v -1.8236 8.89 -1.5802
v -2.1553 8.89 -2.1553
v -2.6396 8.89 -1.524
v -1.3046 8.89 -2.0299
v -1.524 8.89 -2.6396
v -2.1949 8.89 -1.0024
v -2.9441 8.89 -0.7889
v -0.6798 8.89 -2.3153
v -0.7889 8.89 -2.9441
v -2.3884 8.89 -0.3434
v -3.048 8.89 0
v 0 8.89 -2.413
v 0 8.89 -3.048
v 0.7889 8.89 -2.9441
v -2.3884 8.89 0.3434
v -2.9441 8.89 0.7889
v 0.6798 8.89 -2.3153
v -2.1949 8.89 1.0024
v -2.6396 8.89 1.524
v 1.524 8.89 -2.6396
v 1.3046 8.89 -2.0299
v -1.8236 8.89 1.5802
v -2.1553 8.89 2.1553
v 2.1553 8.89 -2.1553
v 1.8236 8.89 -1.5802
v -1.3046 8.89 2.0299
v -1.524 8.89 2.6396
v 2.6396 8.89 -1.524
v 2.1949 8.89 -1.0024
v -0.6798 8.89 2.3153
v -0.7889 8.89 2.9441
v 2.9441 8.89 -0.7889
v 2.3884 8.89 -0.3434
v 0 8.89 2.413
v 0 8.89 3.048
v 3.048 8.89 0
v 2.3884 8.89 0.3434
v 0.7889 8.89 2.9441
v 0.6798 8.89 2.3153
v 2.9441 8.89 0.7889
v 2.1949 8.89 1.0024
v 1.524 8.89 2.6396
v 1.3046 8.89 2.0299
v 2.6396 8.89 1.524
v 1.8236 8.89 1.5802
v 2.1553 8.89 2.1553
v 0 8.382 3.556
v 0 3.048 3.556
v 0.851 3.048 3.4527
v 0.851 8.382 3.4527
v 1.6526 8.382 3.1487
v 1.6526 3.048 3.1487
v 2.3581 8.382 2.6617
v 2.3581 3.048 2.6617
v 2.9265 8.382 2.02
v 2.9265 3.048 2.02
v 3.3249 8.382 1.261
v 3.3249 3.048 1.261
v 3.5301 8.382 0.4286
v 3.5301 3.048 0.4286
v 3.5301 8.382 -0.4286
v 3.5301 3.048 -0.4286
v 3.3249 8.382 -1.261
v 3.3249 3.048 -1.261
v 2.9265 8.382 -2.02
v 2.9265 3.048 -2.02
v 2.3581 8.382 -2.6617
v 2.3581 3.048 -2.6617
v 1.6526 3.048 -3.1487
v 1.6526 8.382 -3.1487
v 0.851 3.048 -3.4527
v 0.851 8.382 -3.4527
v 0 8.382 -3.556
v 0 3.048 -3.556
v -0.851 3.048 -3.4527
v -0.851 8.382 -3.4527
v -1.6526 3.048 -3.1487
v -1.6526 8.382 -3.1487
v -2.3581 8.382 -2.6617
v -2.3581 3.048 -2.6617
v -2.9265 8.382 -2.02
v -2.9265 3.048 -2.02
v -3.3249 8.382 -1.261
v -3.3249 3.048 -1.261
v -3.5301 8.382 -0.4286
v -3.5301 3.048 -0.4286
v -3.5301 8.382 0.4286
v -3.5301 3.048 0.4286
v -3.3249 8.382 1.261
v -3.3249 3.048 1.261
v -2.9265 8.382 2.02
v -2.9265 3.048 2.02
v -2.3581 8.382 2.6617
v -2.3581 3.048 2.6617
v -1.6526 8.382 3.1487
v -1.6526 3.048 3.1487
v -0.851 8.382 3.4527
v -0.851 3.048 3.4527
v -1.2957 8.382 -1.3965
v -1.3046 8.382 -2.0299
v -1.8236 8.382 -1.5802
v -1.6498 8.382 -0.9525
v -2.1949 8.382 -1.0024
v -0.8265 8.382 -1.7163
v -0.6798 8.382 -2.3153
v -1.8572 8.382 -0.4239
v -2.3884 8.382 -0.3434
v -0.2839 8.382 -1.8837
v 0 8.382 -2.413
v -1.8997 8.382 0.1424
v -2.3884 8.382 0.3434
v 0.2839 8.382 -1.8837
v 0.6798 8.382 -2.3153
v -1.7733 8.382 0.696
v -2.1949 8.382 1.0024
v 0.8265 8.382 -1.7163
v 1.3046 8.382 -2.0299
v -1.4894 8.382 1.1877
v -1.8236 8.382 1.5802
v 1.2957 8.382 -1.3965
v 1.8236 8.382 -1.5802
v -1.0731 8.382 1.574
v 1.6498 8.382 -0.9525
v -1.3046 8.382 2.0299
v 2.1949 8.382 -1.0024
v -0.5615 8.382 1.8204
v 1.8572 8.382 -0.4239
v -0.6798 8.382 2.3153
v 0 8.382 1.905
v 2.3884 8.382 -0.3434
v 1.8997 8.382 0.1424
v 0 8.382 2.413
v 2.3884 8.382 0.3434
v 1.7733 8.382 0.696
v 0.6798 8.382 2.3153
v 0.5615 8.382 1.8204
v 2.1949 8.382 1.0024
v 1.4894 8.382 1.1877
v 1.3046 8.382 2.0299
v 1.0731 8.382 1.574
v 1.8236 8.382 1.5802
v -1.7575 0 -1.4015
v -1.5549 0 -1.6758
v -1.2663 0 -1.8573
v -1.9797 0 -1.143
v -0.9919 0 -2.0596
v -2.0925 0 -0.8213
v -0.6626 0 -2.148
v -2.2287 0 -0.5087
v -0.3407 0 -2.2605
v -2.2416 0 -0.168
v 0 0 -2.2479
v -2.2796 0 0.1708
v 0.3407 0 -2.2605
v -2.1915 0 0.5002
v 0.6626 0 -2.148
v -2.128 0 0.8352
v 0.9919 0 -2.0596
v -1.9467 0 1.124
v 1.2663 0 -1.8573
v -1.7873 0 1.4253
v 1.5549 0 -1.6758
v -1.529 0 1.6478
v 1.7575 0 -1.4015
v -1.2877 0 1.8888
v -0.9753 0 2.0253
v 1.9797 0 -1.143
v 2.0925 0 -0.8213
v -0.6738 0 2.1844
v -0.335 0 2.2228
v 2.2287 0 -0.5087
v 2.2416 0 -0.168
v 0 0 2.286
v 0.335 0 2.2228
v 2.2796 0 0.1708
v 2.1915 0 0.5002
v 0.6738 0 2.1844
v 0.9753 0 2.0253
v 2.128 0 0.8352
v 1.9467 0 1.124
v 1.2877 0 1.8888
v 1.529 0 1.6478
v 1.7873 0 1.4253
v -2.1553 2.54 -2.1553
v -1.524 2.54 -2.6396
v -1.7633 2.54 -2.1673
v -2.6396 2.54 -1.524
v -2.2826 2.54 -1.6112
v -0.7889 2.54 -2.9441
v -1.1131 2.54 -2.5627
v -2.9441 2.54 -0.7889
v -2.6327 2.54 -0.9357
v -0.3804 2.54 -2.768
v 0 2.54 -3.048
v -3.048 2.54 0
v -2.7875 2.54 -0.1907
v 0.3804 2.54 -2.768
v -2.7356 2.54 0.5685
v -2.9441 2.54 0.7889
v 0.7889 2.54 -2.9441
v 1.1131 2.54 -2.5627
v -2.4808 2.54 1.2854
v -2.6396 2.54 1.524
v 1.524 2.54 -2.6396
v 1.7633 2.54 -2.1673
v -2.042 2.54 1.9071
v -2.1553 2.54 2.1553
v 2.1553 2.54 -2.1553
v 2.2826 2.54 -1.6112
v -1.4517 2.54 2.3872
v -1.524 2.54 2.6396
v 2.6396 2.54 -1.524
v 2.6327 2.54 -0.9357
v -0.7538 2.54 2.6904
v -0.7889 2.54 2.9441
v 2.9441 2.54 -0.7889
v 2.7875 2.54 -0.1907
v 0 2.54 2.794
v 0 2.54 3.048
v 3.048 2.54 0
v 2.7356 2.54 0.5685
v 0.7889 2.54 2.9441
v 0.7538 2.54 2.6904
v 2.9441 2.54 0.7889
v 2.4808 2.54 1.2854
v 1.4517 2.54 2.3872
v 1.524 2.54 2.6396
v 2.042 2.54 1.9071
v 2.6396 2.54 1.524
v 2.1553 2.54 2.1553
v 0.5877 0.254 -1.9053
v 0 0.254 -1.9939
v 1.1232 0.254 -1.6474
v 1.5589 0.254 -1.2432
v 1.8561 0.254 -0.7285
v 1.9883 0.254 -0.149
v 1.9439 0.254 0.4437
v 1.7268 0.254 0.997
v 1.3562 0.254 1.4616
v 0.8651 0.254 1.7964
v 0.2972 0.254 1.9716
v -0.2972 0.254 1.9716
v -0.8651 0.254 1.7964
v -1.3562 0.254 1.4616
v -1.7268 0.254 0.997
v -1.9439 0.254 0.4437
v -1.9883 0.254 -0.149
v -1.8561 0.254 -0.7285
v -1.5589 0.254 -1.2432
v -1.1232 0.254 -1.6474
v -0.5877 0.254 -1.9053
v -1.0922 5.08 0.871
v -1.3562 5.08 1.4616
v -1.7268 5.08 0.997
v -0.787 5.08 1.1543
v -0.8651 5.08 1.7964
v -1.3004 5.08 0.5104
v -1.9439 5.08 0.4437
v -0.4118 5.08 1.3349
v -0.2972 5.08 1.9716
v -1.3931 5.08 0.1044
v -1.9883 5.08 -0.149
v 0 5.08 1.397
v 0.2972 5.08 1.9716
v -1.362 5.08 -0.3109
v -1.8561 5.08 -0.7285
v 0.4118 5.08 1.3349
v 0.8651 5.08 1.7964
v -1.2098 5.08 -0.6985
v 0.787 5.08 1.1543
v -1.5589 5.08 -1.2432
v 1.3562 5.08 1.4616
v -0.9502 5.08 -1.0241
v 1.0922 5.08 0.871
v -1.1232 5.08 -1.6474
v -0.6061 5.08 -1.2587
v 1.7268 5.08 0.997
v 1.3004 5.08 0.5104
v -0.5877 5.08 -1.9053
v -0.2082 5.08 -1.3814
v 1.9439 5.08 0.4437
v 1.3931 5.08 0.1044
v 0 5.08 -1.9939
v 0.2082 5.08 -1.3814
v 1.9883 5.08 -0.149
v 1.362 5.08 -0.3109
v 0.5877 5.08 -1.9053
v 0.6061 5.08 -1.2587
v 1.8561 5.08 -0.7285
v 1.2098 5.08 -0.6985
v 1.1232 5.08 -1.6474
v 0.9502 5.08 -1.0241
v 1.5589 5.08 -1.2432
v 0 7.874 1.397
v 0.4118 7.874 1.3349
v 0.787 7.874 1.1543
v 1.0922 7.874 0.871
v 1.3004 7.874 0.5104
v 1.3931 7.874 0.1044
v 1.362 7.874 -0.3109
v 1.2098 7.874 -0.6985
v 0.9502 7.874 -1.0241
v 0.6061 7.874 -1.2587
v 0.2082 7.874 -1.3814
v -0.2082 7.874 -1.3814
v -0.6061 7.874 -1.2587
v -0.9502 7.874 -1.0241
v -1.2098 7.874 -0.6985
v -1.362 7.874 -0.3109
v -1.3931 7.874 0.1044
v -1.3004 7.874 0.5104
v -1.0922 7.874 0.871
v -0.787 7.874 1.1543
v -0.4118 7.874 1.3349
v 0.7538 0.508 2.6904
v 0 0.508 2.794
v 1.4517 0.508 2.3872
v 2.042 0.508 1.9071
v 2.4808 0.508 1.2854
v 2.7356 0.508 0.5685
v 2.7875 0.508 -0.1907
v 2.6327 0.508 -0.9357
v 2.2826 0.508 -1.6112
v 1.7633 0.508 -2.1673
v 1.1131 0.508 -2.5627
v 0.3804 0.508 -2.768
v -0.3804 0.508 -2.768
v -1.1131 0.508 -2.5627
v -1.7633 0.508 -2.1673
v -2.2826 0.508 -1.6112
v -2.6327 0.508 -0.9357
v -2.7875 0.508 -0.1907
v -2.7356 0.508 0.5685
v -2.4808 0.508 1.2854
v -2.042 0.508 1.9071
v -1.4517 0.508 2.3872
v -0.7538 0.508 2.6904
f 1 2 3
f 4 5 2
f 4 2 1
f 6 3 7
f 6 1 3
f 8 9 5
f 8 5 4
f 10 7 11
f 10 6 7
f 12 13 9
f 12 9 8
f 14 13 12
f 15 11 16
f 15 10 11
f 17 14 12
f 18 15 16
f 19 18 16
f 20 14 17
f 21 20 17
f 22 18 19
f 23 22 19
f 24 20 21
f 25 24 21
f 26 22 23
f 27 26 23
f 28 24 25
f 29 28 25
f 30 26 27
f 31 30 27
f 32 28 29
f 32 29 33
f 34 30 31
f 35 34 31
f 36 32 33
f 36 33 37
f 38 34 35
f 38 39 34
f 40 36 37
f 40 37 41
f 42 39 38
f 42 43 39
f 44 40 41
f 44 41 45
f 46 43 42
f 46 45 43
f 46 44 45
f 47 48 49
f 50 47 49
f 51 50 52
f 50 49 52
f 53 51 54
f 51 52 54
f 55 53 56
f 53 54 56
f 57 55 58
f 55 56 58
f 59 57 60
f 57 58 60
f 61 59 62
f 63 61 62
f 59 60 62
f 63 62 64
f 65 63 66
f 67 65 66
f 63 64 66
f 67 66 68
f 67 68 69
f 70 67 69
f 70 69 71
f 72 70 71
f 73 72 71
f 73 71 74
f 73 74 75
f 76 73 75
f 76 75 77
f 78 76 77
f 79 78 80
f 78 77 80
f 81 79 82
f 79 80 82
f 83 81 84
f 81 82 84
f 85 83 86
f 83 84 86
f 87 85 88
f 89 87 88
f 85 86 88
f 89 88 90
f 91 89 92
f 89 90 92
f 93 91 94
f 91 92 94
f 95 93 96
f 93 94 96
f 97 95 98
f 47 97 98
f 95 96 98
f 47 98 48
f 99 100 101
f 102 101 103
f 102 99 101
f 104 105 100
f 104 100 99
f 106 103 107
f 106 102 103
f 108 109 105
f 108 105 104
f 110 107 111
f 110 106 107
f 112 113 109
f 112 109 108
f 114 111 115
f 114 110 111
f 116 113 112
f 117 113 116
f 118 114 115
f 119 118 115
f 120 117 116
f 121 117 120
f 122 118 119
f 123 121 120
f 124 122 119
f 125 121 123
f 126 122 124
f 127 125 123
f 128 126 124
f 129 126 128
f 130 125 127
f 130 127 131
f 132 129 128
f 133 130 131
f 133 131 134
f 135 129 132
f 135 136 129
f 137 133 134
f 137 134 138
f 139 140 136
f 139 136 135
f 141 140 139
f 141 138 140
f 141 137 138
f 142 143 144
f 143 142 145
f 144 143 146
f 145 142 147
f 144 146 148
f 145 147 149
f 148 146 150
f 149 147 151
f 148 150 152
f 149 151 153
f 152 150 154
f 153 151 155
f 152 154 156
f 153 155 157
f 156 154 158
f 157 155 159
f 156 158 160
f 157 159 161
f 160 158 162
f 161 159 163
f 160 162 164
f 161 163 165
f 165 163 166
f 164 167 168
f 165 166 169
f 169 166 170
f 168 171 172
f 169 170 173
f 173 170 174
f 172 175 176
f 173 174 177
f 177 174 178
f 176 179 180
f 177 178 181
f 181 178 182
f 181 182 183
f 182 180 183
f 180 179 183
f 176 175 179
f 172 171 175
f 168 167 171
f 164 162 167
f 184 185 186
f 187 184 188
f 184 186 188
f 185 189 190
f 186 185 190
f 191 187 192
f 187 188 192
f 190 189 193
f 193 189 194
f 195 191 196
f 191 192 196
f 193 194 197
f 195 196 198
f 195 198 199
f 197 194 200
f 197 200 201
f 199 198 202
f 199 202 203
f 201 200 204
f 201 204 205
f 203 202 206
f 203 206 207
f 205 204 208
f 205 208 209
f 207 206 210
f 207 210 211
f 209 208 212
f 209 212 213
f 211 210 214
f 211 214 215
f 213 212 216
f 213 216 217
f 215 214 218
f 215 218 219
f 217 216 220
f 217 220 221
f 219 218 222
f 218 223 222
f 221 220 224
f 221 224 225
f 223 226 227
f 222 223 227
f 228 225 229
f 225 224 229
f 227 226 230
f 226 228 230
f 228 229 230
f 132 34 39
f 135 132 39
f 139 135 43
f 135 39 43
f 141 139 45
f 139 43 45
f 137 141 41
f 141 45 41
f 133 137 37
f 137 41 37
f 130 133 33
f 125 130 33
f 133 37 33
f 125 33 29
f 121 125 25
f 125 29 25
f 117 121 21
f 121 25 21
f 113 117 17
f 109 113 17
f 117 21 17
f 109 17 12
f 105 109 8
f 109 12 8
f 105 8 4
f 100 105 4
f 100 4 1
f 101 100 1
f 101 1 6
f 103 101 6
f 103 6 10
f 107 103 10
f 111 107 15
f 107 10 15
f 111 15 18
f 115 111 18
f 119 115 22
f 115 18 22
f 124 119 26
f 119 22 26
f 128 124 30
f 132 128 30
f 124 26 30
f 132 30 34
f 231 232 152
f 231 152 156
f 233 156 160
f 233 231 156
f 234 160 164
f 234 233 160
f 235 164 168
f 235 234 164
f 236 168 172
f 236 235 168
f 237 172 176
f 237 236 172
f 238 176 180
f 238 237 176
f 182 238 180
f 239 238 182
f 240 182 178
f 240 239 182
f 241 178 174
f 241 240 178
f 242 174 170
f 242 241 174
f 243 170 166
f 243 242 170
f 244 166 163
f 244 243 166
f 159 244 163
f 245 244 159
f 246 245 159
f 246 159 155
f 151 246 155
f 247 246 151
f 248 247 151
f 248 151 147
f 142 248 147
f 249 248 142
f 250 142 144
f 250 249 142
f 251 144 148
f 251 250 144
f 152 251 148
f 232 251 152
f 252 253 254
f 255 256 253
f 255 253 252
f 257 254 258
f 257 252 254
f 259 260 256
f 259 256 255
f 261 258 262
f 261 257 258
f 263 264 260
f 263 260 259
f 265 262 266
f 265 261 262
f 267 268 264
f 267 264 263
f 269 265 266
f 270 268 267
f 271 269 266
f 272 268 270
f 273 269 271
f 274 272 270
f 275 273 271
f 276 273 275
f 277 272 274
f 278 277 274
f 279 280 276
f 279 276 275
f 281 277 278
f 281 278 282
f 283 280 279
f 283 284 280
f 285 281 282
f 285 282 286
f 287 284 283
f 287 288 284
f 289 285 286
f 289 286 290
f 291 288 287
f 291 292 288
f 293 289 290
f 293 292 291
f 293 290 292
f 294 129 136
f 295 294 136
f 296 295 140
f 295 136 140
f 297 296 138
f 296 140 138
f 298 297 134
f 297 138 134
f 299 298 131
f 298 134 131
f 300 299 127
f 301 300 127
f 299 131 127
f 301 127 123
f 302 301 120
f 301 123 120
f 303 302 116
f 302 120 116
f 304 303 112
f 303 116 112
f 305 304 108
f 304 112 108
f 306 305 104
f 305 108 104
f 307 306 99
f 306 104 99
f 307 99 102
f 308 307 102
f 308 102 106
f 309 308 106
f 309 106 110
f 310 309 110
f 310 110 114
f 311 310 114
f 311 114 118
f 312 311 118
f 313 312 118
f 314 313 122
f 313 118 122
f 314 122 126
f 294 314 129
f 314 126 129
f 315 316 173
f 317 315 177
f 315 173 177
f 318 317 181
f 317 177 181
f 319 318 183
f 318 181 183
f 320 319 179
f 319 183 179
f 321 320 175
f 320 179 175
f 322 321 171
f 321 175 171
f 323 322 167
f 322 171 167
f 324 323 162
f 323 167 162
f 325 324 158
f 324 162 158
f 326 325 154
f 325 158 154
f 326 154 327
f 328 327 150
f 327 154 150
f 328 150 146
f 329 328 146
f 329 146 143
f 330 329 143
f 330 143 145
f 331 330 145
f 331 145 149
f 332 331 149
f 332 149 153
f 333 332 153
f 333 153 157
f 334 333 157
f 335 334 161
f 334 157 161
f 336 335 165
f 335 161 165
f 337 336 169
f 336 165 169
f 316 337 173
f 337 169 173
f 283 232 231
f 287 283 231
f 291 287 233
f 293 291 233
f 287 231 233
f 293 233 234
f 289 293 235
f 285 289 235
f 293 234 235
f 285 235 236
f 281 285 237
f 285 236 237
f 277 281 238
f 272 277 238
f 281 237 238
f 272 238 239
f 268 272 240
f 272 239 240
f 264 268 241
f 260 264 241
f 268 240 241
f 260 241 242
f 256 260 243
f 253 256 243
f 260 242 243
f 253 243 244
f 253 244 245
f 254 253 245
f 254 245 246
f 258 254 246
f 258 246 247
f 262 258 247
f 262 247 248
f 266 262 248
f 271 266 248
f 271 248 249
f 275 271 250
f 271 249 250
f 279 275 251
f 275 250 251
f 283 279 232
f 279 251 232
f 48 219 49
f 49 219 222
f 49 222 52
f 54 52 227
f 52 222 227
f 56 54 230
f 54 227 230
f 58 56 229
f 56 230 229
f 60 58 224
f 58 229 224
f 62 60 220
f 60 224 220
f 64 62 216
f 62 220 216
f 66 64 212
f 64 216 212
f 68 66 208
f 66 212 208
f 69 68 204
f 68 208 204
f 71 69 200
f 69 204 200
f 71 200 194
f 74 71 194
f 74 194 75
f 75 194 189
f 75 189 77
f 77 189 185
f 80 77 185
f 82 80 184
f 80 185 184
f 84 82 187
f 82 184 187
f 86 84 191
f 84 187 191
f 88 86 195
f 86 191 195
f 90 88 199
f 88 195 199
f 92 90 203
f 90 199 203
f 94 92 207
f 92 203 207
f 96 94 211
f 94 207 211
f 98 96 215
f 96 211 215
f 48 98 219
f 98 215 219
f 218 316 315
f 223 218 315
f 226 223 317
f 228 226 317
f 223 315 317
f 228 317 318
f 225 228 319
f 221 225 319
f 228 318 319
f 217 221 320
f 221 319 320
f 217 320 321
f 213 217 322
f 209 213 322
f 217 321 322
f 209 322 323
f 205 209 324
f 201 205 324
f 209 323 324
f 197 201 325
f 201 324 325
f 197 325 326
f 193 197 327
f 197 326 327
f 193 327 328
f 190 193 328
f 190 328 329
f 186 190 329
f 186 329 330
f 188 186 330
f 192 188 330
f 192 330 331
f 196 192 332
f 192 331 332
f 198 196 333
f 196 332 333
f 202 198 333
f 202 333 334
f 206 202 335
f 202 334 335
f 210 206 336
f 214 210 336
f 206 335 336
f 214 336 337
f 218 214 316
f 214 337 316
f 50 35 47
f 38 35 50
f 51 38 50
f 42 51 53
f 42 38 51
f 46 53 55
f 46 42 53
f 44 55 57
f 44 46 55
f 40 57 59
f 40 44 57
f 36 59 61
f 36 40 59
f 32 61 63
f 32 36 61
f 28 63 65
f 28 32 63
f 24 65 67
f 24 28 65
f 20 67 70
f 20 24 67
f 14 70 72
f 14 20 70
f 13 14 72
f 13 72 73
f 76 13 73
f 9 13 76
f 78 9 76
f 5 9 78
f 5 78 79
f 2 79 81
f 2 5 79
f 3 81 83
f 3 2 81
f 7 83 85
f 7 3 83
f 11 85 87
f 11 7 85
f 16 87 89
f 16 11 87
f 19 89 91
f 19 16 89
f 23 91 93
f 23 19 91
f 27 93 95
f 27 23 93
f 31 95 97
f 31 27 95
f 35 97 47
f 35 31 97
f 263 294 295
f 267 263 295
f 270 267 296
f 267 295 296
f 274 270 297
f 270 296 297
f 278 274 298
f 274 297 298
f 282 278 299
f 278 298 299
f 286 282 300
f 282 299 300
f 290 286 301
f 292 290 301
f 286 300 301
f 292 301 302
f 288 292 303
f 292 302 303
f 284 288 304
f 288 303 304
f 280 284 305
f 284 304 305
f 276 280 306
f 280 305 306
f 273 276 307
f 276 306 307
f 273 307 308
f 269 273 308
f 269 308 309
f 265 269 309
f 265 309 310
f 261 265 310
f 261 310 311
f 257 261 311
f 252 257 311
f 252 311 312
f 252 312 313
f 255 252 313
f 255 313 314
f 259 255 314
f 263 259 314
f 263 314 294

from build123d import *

# Parameters (mm, degrees)
SKETCH1_R           = 2.794
BOSS_EXTRUDE1_DEPTH = 2.54
SKETCH2_R           = 3.556
BOSS_EXTRUDE2_DEPTH = 6.35
SKETCH3_R           = 1.397
CUT_EXTRUDE1_DEPTH  = 9.89
SKETCH4_R           = 2.413
CUT_EXTRUDE2_DEPTH  = 0.508
SKETCH5_R           = 1.9939
CUT_EXTRUDE3_DEPTH  = 5.08
CHAMFER1_SIZE       = 0.508
CHAMFER2_SIZE       = 0.254
CHAMFER3_SIZE       = 0.508


with BuildPart() as part:
    # Sketch1 → Boss-Extrude1 (new body)
    with BuildSketch(Plane(origin=(0, 0, 0), x_dir=(1, 0, 0), z_dir=(0, 1, 0))):
        with Locations(Location((0, 0, 0), (0, 0, 270))):  # turned: the seam where the file's is
            Circle(SKETCH1_R)
    extrude(amount=BOSS_EXTRUDE1_DEPTH)

    # Sketch2 → Boss-Extrude2 (add)
    with BuildSketch(Plane(origin=(0, 2.54, 0), x_dir=(1, 0, 0), z_dir=(0, 1, 0))):
        with Locations(Location((0, 0, 0), (0, 0, 270))):  # turned: the seam where the file's is
            Circle(SKETCH2_R)
    extrude(amount=BOSS_EXTRUDE2_DEPTH)

    # Sketch3 → Cut-Extrude1 (cut, through all)
    with BuildSketch(Plane(origin=(0, 8.89, 0), x_dir=(1, 0, 0), z_dir=(0, 1, 0))):
        with Locations(Location((0, 0, 0), (0, 0, 270))):  # turned: the seam where the file's is
            Circle(SKETCH3_R)
    extrude(amount=-CUT_EXTRUDE1_DEPTH, mode=Mode.SUBTRACT)

    # Sketch4 → Cut-Extrude2 (cut)
    with BuildSketch(Plane(origin=(0, 8.89, 0), x_dir=(1, 0, 0), z_dir=(0, 1, 0))):
        with Locations(Location((0, 0, 0), (0, 0, 270))):  # turned: the seam where the file's is
            Circle(SKETCH4_R)
    extrude(amount=-CUT_EXTRUDE2_DEPTH, mode=Mode.SUBTRACT)

    # Sketch5 → Cut-Extrude3 (cut)
    with BuildSketch(Plane.XZ):
        with Locations(Location((0, 0, 0), (0, 0, 270))):  # turned: the seam where the file's is
            Circle(SKETCH5_R)
    extrude(amount=-CUT_EXTRUDE3_DEPTH, mode=Mode.SUBTRACT)

    # Chamfer1
    chamfer1_edges = [part.edges().sort_by_distance(p)[0] for p in [
        (0, 0, -2.794),
        (0, 2.54, -3.556),
        (0, 8.89, -3.556),
    ]]
    chamfer(chamfer1_edges, length=CHAMFER1_SIZE)

    # Chamfer2
    chamfer2_edges = [part.edges().sort_by_distance(p)[0] for p in [
        (0, 0, 1.9939),
    ]]
    chamfer(chamfer2_edges, length=CHAMFER2_SIZE)

    # Chamfer3
    chamfer3_edges = [part.edges().sort_by_distance(p)[0] for p in [
        (0, 8.382, -1.397),
    ]]
    chamfer(chamfer3_edges, length=CHAMFER3_SIZE)


solid = part.part
